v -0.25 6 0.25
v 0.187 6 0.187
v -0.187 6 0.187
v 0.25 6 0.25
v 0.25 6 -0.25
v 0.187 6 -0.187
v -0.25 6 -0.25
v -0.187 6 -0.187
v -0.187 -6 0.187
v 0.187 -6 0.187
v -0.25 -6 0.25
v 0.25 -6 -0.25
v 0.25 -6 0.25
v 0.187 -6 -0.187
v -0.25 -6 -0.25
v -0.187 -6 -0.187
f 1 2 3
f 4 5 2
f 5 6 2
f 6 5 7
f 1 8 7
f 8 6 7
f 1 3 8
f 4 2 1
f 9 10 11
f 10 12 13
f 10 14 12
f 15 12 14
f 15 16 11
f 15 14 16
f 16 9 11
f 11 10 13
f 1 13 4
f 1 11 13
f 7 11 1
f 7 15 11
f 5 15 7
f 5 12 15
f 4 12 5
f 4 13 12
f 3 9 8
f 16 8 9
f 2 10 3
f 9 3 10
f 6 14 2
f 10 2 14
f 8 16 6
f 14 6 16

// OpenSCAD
module BoxBracket(t=0.1, depth=12, w=2, h=2) {
    points = [
        [0, 0],
        [w, 0],
        [w, h],
        [0, h]
    ];
    translate([-w/2, 0, -h/2])
        rotate([90, 0, 0])
            linear_extrude(height=depth, center = true)
                difference() {
                    polygon(points);
                    offset(-t)
                        polygon(points);
                }
}

module BoxBracketHalfxHalf(depth=12) {
    t = 0.063;
    BoxBracket(t, depth, 0.5, 0.5);
}

module BoxBracket1x1(depth=12) {
    t = 0.064;
    BoxBracket(t, depth, 1, 1);
}

%BoxBracket1x1();
BoxBracketHalfxHalf();
